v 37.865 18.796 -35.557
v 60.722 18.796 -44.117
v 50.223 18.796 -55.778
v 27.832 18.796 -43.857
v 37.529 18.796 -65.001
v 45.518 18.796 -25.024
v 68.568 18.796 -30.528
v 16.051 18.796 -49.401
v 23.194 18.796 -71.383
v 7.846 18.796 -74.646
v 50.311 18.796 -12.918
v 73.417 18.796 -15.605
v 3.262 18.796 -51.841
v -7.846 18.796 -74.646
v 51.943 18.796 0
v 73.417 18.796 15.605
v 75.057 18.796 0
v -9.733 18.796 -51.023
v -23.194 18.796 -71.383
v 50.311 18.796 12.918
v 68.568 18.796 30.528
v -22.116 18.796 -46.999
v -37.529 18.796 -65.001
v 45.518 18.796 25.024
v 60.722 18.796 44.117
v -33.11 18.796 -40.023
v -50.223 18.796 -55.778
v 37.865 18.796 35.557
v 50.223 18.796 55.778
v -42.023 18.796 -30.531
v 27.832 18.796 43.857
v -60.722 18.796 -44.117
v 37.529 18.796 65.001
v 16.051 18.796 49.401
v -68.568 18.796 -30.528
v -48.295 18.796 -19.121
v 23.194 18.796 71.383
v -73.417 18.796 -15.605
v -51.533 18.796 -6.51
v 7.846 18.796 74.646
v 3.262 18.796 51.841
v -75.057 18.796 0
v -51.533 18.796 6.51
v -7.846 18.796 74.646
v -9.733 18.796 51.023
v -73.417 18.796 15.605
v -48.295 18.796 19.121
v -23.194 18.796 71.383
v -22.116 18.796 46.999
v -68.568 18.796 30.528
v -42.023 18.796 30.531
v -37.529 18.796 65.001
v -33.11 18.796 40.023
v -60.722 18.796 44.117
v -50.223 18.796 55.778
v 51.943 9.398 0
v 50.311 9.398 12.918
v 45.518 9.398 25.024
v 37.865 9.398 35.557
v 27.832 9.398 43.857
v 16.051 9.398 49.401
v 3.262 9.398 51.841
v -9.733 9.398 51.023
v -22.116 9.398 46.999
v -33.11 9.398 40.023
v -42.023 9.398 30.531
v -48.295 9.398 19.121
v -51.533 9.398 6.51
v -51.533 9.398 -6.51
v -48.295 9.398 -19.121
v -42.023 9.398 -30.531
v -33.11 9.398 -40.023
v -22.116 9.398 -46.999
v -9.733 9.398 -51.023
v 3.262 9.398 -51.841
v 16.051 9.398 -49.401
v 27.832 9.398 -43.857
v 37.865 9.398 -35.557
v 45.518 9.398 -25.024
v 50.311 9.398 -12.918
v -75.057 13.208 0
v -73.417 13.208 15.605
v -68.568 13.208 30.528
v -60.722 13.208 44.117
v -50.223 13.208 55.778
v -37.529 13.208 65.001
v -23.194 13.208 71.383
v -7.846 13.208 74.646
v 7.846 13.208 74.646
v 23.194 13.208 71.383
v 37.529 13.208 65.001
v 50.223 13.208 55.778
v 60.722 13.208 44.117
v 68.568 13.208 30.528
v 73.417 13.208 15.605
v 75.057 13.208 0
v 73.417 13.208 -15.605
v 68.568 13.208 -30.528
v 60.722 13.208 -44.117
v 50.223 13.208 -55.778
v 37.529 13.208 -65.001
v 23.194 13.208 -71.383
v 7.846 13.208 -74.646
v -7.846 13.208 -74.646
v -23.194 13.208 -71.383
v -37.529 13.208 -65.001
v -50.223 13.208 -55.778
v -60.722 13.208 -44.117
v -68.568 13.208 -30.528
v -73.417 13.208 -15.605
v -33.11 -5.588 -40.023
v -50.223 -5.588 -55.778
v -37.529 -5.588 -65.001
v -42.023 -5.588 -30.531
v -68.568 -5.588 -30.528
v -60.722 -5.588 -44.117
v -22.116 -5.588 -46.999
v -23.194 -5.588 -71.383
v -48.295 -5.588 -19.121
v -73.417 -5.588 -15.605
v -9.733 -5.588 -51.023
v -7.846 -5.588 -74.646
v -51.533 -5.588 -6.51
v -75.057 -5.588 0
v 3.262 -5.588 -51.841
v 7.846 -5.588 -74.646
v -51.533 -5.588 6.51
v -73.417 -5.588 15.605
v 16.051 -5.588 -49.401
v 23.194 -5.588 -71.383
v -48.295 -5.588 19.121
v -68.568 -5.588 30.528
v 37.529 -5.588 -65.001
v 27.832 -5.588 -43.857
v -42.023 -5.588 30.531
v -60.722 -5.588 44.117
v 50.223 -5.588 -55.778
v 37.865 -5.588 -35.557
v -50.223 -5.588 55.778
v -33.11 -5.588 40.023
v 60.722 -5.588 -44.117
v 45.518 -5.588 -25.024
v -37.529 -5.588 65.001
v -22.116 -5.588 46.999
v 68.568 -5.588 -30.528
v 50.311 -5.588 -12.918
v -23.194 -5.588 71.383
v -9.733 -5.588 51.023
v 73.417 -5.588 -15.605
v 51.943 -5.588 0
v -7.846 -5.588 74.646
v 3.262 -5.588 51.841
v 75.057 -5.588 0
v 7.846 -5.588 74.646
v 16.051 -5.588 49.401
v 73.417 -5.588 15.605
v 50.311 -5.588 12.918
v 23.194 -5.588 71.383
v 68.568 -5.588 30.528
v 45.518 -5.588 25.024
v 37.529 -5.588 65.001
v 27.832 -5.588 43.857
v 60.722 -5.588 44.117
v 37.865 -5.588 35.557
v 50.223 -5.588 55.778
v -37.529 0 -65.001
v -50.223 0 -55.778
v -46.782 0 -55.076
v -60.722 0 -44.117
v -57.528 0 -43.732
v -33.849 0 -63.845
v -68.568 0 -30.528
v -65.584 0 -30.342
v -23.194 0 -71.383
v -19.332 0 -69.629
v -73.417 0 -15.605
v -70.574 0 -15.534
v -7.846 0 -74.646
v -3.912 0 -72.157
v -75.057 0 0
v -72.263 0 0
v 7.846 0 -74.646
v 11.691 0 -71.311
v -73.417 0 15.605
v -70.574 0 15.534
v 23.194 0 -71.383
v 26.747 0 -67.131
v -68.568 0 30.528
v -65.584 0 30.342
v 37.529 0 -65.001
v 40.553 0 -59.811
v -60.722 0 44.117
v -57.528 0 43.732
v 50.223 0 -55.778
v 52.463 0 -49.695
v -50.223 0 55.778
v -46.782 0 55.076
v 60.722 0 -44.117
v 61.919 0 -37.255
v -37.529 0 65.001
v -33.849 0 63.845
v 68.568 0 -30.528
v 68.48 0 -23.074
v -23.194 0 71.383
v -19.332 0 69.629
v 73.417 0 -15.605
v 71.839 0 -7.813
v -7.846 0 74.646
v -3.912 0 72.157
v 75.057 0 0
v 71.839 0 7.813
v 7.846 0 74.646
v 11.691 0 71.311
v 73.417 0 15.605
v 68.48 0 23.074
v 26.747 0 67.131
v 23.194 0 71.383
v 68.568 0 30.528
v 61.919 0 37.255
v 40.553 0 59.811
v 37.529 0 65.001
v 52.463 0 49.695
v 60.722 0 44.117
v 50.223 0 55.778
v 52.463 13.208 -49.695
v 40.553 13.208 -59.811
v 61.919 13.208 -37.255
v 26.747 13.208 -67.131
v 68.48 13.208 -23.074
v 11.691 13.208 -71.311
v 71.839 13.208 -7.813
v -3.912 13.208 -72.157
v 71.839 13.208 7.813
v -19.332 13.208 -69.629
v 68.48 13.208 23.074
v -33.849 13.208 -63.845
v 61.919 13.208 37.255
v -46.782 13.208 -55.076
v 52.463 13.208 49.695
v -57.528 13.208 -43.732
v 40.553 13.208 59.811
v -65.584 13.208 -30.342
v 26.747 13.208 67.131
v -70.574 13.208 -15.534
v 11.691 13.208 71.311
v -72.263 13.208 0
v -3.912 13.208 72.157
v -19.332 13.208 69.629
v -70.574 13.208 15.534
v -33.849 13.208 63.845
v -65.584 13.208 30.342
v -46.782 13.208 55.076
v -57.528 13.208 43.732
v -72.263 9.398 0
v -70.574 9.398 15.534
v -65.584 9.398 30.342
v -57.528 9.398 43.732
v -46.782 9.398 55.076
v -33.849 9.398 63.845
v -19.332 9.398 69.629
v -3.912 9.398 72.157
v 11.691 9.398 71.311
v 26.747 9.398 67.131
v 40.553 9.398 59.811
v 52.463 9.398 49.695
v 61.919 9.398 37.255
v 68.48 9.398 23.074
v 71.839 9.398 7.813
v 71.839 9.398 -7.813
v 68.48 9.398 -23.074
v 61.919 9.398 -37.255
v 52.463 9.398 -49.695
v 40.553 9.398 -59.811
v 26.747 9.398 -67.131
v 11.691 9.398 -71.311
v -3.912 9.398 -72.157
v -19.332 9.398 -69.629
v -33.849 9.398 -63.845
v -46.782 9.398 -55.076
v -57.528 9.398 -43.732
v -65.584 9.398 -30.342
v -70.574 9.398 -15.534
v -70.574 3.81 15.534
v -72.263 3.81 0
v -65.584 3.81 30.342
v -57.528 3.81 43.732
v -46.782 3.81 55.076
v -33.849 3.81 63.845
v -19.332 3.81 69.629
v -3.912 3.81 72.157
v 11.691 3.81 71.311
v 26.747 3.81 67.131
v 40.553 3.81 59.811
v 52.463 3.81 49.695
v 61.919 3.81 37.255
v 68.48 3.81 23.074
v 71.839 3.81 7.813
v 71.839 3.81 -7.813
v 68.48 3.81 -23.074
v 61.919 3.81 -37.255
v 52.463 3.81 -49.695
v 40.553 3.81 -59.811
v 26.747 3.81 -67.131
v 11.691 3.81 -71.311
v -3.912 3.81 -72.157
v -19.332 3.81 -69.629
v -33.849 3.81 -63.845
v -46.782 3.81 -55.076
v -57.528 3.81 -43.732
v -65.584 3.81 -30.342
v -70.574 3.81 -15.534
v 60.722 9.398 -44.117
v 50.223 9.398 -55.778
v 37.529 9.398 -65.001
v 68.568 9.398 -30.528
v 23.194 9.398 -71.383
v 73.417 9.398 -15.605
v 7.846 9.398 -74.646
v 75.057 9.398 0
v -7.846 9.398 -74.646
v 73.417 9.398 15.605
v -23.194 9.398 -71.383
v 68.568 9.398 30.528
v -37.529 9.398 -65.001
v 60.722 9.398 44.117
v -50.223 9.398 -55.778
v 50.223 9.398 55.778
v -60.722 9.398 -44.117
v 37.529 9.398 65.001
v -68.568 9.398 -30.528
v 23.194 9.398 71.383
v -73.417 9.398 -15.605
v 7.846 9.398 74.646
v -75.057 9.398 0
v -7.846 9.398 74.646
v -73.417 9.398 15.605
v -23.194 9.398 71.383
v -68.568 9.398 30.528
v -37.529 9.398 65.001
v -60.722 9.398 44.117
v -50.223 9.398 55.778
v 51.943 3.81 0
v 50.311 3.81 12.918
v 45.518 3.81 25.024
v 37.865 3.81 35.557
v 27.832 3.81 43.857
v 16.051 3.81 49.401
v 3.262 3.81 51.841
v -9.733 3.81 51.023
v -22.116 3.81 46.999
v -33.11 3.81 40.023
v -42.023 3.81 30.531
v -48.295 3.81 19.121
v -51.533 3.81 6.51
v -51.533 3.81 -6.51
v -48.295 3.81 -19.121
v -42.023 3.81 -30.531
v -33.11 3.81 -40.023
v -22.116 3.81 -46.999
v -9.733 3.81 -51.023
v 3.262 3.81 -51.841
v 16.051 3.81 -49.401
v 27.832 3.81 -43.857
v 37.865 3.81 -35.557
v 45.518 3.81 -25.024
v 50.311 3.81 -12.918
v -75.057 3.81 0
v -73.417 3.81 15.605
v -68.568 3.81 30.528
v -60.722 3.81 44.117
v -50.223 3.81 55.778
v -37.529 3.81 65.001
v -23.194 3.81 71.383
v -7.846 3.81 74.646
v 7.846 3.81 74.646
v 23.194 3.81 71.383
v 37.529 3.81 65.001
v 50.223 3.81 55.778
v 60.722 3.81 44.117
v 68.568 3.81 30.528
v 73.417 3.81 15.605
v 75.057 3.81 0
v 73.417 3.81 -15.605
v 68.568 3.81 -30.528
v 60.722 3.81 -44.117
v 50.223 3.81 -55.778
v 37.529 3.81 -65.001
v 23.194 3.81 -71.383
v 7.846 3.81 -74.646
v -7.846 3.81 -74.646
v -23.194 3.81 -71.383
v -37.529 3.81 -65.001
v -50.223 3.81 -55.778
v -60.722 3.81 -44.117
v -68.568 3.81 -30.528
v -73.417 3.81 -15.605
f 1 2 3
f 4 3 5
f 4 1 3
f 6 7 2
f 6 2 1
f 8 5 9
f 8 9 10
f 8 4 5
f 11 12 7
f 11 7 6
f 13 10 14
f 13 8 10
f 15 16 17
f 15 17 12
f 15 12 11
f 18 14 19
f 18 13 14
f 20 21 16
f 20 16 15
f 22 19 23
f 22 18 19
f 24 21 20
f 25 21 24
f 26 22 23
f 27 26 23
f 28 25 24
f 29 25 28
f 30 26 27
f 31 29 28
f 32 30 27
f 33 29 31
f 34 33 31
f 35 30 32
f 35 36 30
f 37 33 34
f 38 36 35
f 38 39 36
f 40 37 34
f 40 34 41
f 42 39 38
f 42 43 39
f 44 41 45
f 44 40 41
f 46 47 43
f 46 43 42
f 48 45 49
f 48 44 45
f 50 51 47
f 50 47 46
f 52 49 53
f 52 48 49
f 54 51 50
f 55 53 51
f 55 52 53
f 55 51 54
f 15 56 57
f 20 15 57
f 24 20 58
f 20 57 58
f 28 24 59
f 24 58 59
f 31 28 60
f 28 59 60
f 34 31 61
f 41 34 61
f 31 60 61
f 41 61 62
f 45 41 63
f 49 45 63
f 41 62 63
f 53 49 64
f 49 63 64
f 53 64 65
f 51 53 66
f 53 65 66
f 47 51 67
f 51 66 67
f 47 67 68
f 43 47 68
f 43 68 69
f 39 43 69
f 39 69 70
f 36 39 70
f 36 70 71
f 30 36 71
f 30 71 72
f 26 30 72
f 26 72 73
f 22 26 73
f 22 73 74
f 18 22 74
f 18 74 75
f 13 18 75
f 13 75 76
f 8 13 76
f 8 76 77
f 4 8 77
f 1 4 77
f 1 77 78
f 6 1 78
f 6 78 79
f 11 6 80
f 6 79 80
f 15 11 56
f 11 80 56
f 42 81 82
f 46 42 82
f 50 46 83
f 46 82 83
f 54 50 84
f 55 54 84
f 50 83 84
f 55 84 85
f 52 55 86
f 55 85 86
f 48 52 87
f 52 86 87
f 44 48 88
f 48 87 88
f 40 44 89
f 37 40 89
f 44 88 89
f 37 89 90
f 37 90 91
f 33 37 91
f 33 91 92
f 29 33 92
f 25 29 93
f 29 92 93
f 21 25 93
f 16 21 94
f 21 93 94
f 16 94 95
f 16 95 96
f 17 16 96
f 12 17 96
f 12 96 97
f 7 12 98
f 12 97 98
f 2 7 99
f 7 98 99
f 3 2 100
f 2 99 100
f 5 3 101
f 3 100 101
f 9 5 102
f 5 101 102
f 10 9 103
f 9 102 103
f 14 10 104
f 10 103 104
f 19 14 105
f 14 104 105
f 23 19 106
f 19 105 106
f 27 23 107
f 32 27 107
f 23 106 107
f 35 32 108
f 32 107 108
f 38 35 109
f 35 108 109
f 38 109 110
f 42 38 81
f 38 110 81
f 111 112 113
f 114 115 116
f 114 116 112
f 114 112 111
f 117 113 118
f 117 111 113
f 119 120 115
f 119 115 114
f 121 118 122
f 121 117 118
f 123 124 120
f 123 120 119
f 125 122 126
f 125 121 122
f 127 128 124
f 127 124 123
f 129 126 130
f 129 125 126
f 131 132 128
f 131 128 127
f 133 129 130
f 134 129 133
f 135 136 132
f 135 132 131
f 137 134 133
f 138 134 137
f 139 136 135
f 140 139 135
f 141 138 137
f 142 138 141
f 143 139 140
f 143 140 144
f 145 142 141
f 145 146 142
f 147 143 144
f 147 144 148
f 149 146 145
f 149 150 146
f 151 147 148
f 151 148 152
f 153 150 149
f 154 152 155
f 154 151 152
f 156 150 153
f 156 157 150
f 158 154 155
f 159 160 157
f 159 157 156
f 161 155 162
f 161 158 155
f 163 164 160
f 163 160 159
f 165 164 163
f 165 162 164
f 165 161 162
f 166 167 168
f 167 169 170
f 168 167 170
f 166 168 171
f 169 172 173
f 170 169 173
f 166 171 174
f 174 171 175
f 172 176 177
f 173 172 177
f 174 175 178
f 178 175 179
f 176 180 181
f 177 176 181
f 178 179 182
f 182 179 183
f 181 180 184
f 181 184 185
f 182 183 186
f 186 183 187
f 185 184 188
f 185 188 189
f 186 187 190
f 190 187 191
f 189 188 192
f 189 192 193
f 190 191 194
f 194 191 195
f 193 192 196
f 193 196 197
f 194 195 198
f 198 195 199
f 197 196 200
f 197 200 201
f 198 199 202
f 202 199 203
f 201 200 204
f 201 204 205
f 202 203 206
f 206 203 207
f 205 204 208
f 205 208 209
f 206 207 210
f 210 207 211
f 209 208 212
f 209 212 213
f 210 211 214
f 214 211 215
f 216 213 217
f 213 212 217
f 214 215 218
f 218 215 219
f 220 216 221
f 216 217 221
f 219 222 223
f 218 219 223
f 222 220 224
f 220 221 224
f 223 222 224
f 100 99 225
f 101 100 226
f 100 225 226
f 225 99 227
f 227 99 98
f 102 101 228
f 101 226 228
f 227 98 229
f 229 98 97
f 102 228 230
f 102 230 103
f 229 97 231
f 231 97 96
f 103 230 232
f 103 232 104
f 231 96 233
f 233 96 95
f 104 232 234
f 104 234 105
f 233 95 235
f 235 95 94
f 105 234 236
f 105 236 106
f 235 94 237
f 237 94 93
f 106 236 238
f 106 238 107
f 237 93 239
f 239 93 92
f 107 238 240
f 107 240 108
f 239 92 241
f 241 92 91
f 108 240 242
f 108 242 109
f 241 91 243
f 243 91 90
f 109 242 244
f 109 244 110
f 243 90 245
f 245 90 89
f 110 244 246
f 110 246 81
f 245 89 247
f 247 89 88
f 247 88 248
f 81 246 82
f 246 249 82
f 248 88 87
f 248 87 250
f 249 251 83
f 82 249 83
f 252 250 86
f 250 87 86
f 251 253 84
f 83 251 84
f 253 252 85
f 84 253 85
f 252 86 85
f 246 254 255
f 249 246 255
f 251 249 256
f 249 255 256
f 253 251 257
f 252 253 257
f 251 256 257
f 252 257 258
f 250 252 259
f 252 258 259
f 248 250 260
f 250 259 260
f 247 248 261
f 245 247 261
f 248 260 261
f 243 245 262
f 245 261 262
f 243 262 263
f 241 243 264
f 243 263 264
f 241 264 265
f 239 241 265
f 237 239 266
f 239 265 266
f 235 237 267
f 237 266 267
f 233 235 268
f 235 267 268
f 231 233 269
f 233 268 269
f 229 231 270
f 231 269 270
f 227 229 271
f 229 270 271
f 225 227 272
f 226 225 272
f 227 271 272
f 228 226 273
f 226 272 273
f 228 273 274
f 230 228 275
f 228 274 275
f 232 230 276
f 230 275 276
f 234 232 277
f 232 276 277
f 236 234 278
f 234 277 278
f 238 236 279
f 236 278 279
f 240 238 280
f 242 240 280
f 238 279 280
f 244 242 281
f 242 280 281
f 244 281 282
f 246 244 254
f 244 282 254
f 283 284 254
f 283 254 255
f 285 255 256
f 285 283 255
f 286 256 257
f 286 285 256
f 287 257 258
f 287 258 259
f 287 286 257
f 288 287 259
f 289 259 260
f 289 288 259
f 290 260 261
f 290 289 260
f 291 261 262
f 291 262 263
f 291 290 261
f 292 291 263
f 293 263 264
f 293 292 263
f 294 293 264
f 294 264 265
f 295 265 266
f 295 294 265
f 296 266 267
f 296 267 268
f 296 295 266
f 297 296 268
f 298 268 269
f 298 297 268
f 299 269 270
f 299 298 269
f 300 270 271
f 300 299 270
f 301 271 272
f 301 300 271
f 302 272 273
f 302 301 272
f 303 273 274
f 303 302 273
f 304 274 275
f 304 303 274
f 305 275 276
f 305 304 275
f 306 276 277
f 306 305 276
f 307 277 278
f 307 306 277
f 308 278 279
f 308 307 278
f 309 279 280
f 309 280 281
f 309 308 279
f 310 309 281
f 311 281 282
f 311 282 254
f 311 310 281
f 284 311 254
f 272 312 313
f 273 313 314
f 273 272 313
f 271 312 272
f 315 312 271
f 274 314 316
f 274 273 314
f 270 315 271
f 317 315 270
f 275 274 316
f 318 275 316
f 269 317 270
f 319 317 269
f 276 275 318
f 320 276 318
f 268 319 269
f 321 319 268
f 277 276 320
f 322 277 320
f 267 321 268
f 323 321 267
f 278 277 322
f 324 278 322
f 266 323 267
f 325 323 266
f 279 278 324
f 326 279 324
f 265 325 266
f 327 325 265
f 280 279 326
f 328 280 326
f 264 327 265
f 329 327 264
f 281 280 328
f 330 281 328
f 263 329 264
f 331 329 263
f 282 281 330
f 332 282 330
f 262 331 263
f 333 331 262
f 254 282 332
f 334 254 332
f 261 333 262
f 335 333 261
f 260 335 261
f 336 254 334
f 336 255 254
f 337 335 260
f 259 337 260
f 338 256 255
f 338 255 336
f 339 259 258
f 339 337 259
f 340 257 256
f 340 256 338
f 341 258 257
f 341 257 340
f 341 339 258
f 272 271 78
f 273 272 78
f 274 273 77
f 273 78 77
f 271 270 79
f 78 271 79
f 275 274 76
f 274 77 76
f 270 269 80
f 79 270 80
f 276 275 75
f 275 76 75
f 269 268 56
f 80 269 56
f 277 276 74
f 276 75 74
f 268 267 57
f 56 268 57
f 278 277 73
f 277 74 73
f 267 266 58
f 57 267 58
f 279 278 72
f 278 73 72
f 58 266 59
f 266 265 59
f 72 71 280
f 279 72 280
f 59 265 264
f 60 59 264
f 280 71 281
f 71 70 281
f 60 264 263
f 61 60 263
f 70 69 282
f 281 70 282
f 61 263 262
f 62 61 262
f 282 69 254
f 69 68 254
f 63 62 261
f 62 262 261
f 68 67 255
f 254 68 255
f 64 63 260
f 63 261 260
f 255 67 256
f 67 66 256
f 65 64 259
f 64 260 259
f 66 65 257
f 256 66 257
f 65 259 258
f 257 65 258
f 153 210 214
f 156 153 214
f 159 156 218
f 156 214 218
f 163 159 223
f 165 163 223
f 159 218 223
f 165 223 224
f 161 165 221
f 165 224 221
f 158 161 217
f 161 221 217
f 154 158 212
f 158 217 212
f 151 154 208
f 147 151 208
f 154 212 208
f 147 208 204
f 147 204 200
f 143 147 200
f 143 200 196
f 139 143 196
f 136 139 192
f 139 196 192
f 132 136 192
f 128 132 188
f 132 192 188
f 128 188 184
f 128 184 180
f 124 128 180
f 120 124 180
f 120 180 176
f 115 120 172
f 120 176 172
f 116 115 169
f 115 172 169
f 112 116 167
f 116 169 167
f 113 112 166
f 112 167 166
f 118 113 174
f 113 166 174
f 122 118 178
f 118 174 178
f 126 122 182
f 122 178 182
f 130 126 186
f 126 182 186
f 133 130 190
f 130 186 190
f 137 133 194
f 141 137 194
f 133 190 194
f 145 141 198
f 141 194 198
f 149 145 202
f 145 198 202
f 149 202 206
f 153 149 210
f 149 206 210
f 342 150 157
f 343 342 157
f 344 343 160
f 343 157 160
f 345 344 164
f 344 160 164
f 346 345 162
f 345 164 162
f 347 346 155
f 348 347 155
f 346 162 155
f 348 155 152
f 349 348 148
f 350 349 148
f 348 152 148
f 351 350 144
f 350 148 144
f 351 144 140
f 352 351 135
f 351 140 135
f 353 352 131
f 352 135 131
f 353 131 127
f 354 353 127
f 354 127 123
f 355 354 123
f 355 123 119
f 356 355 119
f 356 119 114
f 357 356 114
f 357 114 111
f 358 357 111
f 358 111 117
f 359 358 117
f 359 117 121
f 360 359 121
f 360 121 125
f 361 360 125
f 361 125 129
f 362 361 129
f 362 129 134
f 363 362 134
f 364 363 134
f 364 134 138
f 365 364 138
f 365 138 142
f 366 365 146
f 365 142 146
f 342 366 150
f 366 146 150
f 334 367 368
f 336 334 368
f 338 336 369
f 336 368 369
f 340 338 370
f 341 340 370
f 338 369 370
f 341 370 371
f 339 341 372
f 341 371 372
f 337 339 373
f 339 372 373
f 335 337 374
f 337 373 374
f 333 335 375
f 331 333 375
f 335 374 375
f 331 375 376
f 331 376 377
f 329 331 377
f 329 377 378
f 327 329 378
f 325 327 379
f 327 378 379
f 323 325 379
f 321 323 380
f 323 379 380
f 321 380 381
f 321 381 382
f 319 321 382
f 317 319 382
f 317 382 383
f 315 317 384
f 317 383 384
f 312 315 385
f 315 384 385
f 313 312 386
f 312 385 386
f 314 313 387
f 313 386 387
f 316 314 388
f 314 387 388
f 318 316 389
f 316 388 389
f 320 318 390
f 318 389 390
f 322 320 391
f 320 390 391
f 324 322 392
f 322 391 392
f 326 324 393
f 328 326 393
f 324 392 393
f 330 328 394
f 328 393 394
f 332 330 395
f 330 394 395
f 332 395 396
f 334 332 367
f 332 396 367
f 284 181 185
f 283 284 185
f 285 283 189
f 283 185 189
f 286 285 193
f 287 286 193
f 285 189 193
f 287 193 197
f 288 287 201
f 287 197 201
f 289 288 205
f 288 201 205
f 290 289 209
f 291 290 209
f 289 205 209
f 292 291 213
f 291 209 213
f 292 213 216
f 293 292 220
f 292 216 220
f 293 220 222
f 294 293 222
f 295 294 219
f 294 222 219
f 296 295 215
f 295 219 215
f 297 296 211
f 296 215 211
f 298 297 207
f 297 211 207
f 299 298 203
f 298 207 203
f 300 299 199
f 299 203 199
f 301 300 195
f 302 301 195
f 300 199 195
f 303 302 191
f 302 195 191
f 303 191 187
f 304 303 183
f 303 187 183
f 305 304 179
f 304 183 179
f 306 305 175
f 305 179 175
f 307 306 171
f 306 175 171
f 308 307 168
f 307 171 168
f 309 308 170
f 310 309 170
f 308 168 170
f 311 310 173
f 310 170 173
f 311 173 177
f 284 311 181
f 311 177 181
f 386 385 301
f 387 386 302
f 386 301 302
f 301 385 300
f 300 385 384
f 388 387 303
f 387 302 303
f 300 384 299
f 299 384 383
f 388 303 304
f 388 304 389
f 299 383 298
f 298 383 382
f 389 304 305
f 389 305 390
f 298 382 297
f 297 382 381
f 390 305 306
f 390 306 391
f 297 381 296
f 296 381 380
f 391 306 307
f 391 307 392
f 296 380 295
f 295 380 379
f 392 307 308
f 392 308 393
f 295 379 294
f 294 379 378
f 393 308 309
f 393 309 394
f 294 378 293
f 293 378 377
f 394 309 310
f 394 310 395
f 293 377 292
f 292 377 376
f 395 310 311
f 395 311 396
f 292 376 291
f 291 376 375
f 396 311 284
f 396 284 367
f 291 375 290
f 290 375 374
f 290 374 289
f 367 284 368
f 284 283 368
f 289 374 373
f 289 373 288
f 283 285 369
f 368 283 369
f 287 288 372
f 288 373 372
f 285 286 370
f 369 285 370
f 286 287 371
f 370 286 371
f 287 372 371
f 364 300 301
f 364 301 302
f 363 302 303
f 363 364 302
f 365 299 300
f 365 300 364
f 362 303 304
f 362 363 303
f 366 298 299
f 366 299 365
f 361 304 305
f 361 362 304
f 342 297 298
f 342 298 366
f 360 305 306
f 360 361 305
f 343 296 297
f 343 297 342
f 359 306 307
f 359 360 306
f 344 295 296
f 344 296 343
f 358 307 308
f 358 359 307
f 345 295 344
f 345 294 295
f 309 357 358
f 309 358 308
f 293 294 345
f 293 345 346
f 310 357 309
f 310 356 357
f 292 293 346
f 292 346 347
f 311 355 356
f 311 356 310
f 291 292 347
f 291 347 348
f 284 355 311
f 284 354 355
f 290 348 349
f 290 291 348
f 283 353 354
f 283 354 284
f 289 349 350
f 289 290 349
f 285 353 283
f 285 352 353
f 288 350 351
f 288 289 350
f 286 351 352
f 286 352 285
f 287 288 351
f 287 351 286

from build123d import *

# Parameters (mm, degrees)
F0_R     = 75.057
F1_DEPTH = 5.588
F2_R     = 72.263
F3_DEPTH = 3.81
F4_R     = 75.057
F4_R_2   = 72.263
F5_DEPTH = 5.588
F6_R     = 72.263
F7_DEPTH = 3.81
F8_R     = 75.057
F9_DEPTH = 5.588
F11_D    = 103.886
F11_2_D  = 103.886


with BuildPart() as f1:
    # F0 (on Front) → F1 (new body)
    with BuildSketch(Plane.XZ):
        Circle(F0_R)
    extrude(amount=F1_DEPTH)

    # F2 (on face) → F3 (join)
    with BuildSketch(Plane(origin=(0, 0, 0), x_dir=(-1, 0, 0), z_dir=(0, 1, 0))):
        Circle(F2_R)
    extrude(amount=F3_DEPTH)

    # F11 (through all)
    with Locations(Plane(origin=(0, 18.796, 0), x_dir=(-1, 0, 0), z_dir=(0, 1, 0))):
        with Locations((0, 0)):
            Hole(F11_D / 2)


with BuildPart() as f5:
    # F4 (on face) → F5 (new body)
    with BuildSketch(Plane(origin=(0, 3.81, 0), x_dir=(-1, 0, 0), z_dir=(0, 1, 0))):
        Circle(F4_R)
        Circle(F4_R_2, mode=Mode.SUBTRACT)
    extrude(amount=F5_DEPTH)


with BuildPart() as f7:
    # F6 (on face) → F7 (new body)
    with BuildSketch(Plane(origin=(0, 9.398, 0), x_dir=(-1, 0, 0), z_dir=(0, 1, 0))):
        Circle(F6_R)
    extrude(amount=F7_DEPTH)

    # F8 (on face) → F9 (join)
    with BuildSketch(Plane(origin=(0, 13.208, 0), x_dir=(-1, 0, 0), z_dir=(0, 1, 0))):
        Circle(F8_R)
    extrude(amount=F9_DEPTH)

    # F11#2 (through all)
    with Locations(Plane(origin=(0, 18.796, 0), x_dir=(-1, 0, 0), z_dir=(0, 1, 0))):
        with Locations((0, 0)):
            Hole(F11_2_D / 2)


solid = Compound([f1.part, f5.part, f7.part])
